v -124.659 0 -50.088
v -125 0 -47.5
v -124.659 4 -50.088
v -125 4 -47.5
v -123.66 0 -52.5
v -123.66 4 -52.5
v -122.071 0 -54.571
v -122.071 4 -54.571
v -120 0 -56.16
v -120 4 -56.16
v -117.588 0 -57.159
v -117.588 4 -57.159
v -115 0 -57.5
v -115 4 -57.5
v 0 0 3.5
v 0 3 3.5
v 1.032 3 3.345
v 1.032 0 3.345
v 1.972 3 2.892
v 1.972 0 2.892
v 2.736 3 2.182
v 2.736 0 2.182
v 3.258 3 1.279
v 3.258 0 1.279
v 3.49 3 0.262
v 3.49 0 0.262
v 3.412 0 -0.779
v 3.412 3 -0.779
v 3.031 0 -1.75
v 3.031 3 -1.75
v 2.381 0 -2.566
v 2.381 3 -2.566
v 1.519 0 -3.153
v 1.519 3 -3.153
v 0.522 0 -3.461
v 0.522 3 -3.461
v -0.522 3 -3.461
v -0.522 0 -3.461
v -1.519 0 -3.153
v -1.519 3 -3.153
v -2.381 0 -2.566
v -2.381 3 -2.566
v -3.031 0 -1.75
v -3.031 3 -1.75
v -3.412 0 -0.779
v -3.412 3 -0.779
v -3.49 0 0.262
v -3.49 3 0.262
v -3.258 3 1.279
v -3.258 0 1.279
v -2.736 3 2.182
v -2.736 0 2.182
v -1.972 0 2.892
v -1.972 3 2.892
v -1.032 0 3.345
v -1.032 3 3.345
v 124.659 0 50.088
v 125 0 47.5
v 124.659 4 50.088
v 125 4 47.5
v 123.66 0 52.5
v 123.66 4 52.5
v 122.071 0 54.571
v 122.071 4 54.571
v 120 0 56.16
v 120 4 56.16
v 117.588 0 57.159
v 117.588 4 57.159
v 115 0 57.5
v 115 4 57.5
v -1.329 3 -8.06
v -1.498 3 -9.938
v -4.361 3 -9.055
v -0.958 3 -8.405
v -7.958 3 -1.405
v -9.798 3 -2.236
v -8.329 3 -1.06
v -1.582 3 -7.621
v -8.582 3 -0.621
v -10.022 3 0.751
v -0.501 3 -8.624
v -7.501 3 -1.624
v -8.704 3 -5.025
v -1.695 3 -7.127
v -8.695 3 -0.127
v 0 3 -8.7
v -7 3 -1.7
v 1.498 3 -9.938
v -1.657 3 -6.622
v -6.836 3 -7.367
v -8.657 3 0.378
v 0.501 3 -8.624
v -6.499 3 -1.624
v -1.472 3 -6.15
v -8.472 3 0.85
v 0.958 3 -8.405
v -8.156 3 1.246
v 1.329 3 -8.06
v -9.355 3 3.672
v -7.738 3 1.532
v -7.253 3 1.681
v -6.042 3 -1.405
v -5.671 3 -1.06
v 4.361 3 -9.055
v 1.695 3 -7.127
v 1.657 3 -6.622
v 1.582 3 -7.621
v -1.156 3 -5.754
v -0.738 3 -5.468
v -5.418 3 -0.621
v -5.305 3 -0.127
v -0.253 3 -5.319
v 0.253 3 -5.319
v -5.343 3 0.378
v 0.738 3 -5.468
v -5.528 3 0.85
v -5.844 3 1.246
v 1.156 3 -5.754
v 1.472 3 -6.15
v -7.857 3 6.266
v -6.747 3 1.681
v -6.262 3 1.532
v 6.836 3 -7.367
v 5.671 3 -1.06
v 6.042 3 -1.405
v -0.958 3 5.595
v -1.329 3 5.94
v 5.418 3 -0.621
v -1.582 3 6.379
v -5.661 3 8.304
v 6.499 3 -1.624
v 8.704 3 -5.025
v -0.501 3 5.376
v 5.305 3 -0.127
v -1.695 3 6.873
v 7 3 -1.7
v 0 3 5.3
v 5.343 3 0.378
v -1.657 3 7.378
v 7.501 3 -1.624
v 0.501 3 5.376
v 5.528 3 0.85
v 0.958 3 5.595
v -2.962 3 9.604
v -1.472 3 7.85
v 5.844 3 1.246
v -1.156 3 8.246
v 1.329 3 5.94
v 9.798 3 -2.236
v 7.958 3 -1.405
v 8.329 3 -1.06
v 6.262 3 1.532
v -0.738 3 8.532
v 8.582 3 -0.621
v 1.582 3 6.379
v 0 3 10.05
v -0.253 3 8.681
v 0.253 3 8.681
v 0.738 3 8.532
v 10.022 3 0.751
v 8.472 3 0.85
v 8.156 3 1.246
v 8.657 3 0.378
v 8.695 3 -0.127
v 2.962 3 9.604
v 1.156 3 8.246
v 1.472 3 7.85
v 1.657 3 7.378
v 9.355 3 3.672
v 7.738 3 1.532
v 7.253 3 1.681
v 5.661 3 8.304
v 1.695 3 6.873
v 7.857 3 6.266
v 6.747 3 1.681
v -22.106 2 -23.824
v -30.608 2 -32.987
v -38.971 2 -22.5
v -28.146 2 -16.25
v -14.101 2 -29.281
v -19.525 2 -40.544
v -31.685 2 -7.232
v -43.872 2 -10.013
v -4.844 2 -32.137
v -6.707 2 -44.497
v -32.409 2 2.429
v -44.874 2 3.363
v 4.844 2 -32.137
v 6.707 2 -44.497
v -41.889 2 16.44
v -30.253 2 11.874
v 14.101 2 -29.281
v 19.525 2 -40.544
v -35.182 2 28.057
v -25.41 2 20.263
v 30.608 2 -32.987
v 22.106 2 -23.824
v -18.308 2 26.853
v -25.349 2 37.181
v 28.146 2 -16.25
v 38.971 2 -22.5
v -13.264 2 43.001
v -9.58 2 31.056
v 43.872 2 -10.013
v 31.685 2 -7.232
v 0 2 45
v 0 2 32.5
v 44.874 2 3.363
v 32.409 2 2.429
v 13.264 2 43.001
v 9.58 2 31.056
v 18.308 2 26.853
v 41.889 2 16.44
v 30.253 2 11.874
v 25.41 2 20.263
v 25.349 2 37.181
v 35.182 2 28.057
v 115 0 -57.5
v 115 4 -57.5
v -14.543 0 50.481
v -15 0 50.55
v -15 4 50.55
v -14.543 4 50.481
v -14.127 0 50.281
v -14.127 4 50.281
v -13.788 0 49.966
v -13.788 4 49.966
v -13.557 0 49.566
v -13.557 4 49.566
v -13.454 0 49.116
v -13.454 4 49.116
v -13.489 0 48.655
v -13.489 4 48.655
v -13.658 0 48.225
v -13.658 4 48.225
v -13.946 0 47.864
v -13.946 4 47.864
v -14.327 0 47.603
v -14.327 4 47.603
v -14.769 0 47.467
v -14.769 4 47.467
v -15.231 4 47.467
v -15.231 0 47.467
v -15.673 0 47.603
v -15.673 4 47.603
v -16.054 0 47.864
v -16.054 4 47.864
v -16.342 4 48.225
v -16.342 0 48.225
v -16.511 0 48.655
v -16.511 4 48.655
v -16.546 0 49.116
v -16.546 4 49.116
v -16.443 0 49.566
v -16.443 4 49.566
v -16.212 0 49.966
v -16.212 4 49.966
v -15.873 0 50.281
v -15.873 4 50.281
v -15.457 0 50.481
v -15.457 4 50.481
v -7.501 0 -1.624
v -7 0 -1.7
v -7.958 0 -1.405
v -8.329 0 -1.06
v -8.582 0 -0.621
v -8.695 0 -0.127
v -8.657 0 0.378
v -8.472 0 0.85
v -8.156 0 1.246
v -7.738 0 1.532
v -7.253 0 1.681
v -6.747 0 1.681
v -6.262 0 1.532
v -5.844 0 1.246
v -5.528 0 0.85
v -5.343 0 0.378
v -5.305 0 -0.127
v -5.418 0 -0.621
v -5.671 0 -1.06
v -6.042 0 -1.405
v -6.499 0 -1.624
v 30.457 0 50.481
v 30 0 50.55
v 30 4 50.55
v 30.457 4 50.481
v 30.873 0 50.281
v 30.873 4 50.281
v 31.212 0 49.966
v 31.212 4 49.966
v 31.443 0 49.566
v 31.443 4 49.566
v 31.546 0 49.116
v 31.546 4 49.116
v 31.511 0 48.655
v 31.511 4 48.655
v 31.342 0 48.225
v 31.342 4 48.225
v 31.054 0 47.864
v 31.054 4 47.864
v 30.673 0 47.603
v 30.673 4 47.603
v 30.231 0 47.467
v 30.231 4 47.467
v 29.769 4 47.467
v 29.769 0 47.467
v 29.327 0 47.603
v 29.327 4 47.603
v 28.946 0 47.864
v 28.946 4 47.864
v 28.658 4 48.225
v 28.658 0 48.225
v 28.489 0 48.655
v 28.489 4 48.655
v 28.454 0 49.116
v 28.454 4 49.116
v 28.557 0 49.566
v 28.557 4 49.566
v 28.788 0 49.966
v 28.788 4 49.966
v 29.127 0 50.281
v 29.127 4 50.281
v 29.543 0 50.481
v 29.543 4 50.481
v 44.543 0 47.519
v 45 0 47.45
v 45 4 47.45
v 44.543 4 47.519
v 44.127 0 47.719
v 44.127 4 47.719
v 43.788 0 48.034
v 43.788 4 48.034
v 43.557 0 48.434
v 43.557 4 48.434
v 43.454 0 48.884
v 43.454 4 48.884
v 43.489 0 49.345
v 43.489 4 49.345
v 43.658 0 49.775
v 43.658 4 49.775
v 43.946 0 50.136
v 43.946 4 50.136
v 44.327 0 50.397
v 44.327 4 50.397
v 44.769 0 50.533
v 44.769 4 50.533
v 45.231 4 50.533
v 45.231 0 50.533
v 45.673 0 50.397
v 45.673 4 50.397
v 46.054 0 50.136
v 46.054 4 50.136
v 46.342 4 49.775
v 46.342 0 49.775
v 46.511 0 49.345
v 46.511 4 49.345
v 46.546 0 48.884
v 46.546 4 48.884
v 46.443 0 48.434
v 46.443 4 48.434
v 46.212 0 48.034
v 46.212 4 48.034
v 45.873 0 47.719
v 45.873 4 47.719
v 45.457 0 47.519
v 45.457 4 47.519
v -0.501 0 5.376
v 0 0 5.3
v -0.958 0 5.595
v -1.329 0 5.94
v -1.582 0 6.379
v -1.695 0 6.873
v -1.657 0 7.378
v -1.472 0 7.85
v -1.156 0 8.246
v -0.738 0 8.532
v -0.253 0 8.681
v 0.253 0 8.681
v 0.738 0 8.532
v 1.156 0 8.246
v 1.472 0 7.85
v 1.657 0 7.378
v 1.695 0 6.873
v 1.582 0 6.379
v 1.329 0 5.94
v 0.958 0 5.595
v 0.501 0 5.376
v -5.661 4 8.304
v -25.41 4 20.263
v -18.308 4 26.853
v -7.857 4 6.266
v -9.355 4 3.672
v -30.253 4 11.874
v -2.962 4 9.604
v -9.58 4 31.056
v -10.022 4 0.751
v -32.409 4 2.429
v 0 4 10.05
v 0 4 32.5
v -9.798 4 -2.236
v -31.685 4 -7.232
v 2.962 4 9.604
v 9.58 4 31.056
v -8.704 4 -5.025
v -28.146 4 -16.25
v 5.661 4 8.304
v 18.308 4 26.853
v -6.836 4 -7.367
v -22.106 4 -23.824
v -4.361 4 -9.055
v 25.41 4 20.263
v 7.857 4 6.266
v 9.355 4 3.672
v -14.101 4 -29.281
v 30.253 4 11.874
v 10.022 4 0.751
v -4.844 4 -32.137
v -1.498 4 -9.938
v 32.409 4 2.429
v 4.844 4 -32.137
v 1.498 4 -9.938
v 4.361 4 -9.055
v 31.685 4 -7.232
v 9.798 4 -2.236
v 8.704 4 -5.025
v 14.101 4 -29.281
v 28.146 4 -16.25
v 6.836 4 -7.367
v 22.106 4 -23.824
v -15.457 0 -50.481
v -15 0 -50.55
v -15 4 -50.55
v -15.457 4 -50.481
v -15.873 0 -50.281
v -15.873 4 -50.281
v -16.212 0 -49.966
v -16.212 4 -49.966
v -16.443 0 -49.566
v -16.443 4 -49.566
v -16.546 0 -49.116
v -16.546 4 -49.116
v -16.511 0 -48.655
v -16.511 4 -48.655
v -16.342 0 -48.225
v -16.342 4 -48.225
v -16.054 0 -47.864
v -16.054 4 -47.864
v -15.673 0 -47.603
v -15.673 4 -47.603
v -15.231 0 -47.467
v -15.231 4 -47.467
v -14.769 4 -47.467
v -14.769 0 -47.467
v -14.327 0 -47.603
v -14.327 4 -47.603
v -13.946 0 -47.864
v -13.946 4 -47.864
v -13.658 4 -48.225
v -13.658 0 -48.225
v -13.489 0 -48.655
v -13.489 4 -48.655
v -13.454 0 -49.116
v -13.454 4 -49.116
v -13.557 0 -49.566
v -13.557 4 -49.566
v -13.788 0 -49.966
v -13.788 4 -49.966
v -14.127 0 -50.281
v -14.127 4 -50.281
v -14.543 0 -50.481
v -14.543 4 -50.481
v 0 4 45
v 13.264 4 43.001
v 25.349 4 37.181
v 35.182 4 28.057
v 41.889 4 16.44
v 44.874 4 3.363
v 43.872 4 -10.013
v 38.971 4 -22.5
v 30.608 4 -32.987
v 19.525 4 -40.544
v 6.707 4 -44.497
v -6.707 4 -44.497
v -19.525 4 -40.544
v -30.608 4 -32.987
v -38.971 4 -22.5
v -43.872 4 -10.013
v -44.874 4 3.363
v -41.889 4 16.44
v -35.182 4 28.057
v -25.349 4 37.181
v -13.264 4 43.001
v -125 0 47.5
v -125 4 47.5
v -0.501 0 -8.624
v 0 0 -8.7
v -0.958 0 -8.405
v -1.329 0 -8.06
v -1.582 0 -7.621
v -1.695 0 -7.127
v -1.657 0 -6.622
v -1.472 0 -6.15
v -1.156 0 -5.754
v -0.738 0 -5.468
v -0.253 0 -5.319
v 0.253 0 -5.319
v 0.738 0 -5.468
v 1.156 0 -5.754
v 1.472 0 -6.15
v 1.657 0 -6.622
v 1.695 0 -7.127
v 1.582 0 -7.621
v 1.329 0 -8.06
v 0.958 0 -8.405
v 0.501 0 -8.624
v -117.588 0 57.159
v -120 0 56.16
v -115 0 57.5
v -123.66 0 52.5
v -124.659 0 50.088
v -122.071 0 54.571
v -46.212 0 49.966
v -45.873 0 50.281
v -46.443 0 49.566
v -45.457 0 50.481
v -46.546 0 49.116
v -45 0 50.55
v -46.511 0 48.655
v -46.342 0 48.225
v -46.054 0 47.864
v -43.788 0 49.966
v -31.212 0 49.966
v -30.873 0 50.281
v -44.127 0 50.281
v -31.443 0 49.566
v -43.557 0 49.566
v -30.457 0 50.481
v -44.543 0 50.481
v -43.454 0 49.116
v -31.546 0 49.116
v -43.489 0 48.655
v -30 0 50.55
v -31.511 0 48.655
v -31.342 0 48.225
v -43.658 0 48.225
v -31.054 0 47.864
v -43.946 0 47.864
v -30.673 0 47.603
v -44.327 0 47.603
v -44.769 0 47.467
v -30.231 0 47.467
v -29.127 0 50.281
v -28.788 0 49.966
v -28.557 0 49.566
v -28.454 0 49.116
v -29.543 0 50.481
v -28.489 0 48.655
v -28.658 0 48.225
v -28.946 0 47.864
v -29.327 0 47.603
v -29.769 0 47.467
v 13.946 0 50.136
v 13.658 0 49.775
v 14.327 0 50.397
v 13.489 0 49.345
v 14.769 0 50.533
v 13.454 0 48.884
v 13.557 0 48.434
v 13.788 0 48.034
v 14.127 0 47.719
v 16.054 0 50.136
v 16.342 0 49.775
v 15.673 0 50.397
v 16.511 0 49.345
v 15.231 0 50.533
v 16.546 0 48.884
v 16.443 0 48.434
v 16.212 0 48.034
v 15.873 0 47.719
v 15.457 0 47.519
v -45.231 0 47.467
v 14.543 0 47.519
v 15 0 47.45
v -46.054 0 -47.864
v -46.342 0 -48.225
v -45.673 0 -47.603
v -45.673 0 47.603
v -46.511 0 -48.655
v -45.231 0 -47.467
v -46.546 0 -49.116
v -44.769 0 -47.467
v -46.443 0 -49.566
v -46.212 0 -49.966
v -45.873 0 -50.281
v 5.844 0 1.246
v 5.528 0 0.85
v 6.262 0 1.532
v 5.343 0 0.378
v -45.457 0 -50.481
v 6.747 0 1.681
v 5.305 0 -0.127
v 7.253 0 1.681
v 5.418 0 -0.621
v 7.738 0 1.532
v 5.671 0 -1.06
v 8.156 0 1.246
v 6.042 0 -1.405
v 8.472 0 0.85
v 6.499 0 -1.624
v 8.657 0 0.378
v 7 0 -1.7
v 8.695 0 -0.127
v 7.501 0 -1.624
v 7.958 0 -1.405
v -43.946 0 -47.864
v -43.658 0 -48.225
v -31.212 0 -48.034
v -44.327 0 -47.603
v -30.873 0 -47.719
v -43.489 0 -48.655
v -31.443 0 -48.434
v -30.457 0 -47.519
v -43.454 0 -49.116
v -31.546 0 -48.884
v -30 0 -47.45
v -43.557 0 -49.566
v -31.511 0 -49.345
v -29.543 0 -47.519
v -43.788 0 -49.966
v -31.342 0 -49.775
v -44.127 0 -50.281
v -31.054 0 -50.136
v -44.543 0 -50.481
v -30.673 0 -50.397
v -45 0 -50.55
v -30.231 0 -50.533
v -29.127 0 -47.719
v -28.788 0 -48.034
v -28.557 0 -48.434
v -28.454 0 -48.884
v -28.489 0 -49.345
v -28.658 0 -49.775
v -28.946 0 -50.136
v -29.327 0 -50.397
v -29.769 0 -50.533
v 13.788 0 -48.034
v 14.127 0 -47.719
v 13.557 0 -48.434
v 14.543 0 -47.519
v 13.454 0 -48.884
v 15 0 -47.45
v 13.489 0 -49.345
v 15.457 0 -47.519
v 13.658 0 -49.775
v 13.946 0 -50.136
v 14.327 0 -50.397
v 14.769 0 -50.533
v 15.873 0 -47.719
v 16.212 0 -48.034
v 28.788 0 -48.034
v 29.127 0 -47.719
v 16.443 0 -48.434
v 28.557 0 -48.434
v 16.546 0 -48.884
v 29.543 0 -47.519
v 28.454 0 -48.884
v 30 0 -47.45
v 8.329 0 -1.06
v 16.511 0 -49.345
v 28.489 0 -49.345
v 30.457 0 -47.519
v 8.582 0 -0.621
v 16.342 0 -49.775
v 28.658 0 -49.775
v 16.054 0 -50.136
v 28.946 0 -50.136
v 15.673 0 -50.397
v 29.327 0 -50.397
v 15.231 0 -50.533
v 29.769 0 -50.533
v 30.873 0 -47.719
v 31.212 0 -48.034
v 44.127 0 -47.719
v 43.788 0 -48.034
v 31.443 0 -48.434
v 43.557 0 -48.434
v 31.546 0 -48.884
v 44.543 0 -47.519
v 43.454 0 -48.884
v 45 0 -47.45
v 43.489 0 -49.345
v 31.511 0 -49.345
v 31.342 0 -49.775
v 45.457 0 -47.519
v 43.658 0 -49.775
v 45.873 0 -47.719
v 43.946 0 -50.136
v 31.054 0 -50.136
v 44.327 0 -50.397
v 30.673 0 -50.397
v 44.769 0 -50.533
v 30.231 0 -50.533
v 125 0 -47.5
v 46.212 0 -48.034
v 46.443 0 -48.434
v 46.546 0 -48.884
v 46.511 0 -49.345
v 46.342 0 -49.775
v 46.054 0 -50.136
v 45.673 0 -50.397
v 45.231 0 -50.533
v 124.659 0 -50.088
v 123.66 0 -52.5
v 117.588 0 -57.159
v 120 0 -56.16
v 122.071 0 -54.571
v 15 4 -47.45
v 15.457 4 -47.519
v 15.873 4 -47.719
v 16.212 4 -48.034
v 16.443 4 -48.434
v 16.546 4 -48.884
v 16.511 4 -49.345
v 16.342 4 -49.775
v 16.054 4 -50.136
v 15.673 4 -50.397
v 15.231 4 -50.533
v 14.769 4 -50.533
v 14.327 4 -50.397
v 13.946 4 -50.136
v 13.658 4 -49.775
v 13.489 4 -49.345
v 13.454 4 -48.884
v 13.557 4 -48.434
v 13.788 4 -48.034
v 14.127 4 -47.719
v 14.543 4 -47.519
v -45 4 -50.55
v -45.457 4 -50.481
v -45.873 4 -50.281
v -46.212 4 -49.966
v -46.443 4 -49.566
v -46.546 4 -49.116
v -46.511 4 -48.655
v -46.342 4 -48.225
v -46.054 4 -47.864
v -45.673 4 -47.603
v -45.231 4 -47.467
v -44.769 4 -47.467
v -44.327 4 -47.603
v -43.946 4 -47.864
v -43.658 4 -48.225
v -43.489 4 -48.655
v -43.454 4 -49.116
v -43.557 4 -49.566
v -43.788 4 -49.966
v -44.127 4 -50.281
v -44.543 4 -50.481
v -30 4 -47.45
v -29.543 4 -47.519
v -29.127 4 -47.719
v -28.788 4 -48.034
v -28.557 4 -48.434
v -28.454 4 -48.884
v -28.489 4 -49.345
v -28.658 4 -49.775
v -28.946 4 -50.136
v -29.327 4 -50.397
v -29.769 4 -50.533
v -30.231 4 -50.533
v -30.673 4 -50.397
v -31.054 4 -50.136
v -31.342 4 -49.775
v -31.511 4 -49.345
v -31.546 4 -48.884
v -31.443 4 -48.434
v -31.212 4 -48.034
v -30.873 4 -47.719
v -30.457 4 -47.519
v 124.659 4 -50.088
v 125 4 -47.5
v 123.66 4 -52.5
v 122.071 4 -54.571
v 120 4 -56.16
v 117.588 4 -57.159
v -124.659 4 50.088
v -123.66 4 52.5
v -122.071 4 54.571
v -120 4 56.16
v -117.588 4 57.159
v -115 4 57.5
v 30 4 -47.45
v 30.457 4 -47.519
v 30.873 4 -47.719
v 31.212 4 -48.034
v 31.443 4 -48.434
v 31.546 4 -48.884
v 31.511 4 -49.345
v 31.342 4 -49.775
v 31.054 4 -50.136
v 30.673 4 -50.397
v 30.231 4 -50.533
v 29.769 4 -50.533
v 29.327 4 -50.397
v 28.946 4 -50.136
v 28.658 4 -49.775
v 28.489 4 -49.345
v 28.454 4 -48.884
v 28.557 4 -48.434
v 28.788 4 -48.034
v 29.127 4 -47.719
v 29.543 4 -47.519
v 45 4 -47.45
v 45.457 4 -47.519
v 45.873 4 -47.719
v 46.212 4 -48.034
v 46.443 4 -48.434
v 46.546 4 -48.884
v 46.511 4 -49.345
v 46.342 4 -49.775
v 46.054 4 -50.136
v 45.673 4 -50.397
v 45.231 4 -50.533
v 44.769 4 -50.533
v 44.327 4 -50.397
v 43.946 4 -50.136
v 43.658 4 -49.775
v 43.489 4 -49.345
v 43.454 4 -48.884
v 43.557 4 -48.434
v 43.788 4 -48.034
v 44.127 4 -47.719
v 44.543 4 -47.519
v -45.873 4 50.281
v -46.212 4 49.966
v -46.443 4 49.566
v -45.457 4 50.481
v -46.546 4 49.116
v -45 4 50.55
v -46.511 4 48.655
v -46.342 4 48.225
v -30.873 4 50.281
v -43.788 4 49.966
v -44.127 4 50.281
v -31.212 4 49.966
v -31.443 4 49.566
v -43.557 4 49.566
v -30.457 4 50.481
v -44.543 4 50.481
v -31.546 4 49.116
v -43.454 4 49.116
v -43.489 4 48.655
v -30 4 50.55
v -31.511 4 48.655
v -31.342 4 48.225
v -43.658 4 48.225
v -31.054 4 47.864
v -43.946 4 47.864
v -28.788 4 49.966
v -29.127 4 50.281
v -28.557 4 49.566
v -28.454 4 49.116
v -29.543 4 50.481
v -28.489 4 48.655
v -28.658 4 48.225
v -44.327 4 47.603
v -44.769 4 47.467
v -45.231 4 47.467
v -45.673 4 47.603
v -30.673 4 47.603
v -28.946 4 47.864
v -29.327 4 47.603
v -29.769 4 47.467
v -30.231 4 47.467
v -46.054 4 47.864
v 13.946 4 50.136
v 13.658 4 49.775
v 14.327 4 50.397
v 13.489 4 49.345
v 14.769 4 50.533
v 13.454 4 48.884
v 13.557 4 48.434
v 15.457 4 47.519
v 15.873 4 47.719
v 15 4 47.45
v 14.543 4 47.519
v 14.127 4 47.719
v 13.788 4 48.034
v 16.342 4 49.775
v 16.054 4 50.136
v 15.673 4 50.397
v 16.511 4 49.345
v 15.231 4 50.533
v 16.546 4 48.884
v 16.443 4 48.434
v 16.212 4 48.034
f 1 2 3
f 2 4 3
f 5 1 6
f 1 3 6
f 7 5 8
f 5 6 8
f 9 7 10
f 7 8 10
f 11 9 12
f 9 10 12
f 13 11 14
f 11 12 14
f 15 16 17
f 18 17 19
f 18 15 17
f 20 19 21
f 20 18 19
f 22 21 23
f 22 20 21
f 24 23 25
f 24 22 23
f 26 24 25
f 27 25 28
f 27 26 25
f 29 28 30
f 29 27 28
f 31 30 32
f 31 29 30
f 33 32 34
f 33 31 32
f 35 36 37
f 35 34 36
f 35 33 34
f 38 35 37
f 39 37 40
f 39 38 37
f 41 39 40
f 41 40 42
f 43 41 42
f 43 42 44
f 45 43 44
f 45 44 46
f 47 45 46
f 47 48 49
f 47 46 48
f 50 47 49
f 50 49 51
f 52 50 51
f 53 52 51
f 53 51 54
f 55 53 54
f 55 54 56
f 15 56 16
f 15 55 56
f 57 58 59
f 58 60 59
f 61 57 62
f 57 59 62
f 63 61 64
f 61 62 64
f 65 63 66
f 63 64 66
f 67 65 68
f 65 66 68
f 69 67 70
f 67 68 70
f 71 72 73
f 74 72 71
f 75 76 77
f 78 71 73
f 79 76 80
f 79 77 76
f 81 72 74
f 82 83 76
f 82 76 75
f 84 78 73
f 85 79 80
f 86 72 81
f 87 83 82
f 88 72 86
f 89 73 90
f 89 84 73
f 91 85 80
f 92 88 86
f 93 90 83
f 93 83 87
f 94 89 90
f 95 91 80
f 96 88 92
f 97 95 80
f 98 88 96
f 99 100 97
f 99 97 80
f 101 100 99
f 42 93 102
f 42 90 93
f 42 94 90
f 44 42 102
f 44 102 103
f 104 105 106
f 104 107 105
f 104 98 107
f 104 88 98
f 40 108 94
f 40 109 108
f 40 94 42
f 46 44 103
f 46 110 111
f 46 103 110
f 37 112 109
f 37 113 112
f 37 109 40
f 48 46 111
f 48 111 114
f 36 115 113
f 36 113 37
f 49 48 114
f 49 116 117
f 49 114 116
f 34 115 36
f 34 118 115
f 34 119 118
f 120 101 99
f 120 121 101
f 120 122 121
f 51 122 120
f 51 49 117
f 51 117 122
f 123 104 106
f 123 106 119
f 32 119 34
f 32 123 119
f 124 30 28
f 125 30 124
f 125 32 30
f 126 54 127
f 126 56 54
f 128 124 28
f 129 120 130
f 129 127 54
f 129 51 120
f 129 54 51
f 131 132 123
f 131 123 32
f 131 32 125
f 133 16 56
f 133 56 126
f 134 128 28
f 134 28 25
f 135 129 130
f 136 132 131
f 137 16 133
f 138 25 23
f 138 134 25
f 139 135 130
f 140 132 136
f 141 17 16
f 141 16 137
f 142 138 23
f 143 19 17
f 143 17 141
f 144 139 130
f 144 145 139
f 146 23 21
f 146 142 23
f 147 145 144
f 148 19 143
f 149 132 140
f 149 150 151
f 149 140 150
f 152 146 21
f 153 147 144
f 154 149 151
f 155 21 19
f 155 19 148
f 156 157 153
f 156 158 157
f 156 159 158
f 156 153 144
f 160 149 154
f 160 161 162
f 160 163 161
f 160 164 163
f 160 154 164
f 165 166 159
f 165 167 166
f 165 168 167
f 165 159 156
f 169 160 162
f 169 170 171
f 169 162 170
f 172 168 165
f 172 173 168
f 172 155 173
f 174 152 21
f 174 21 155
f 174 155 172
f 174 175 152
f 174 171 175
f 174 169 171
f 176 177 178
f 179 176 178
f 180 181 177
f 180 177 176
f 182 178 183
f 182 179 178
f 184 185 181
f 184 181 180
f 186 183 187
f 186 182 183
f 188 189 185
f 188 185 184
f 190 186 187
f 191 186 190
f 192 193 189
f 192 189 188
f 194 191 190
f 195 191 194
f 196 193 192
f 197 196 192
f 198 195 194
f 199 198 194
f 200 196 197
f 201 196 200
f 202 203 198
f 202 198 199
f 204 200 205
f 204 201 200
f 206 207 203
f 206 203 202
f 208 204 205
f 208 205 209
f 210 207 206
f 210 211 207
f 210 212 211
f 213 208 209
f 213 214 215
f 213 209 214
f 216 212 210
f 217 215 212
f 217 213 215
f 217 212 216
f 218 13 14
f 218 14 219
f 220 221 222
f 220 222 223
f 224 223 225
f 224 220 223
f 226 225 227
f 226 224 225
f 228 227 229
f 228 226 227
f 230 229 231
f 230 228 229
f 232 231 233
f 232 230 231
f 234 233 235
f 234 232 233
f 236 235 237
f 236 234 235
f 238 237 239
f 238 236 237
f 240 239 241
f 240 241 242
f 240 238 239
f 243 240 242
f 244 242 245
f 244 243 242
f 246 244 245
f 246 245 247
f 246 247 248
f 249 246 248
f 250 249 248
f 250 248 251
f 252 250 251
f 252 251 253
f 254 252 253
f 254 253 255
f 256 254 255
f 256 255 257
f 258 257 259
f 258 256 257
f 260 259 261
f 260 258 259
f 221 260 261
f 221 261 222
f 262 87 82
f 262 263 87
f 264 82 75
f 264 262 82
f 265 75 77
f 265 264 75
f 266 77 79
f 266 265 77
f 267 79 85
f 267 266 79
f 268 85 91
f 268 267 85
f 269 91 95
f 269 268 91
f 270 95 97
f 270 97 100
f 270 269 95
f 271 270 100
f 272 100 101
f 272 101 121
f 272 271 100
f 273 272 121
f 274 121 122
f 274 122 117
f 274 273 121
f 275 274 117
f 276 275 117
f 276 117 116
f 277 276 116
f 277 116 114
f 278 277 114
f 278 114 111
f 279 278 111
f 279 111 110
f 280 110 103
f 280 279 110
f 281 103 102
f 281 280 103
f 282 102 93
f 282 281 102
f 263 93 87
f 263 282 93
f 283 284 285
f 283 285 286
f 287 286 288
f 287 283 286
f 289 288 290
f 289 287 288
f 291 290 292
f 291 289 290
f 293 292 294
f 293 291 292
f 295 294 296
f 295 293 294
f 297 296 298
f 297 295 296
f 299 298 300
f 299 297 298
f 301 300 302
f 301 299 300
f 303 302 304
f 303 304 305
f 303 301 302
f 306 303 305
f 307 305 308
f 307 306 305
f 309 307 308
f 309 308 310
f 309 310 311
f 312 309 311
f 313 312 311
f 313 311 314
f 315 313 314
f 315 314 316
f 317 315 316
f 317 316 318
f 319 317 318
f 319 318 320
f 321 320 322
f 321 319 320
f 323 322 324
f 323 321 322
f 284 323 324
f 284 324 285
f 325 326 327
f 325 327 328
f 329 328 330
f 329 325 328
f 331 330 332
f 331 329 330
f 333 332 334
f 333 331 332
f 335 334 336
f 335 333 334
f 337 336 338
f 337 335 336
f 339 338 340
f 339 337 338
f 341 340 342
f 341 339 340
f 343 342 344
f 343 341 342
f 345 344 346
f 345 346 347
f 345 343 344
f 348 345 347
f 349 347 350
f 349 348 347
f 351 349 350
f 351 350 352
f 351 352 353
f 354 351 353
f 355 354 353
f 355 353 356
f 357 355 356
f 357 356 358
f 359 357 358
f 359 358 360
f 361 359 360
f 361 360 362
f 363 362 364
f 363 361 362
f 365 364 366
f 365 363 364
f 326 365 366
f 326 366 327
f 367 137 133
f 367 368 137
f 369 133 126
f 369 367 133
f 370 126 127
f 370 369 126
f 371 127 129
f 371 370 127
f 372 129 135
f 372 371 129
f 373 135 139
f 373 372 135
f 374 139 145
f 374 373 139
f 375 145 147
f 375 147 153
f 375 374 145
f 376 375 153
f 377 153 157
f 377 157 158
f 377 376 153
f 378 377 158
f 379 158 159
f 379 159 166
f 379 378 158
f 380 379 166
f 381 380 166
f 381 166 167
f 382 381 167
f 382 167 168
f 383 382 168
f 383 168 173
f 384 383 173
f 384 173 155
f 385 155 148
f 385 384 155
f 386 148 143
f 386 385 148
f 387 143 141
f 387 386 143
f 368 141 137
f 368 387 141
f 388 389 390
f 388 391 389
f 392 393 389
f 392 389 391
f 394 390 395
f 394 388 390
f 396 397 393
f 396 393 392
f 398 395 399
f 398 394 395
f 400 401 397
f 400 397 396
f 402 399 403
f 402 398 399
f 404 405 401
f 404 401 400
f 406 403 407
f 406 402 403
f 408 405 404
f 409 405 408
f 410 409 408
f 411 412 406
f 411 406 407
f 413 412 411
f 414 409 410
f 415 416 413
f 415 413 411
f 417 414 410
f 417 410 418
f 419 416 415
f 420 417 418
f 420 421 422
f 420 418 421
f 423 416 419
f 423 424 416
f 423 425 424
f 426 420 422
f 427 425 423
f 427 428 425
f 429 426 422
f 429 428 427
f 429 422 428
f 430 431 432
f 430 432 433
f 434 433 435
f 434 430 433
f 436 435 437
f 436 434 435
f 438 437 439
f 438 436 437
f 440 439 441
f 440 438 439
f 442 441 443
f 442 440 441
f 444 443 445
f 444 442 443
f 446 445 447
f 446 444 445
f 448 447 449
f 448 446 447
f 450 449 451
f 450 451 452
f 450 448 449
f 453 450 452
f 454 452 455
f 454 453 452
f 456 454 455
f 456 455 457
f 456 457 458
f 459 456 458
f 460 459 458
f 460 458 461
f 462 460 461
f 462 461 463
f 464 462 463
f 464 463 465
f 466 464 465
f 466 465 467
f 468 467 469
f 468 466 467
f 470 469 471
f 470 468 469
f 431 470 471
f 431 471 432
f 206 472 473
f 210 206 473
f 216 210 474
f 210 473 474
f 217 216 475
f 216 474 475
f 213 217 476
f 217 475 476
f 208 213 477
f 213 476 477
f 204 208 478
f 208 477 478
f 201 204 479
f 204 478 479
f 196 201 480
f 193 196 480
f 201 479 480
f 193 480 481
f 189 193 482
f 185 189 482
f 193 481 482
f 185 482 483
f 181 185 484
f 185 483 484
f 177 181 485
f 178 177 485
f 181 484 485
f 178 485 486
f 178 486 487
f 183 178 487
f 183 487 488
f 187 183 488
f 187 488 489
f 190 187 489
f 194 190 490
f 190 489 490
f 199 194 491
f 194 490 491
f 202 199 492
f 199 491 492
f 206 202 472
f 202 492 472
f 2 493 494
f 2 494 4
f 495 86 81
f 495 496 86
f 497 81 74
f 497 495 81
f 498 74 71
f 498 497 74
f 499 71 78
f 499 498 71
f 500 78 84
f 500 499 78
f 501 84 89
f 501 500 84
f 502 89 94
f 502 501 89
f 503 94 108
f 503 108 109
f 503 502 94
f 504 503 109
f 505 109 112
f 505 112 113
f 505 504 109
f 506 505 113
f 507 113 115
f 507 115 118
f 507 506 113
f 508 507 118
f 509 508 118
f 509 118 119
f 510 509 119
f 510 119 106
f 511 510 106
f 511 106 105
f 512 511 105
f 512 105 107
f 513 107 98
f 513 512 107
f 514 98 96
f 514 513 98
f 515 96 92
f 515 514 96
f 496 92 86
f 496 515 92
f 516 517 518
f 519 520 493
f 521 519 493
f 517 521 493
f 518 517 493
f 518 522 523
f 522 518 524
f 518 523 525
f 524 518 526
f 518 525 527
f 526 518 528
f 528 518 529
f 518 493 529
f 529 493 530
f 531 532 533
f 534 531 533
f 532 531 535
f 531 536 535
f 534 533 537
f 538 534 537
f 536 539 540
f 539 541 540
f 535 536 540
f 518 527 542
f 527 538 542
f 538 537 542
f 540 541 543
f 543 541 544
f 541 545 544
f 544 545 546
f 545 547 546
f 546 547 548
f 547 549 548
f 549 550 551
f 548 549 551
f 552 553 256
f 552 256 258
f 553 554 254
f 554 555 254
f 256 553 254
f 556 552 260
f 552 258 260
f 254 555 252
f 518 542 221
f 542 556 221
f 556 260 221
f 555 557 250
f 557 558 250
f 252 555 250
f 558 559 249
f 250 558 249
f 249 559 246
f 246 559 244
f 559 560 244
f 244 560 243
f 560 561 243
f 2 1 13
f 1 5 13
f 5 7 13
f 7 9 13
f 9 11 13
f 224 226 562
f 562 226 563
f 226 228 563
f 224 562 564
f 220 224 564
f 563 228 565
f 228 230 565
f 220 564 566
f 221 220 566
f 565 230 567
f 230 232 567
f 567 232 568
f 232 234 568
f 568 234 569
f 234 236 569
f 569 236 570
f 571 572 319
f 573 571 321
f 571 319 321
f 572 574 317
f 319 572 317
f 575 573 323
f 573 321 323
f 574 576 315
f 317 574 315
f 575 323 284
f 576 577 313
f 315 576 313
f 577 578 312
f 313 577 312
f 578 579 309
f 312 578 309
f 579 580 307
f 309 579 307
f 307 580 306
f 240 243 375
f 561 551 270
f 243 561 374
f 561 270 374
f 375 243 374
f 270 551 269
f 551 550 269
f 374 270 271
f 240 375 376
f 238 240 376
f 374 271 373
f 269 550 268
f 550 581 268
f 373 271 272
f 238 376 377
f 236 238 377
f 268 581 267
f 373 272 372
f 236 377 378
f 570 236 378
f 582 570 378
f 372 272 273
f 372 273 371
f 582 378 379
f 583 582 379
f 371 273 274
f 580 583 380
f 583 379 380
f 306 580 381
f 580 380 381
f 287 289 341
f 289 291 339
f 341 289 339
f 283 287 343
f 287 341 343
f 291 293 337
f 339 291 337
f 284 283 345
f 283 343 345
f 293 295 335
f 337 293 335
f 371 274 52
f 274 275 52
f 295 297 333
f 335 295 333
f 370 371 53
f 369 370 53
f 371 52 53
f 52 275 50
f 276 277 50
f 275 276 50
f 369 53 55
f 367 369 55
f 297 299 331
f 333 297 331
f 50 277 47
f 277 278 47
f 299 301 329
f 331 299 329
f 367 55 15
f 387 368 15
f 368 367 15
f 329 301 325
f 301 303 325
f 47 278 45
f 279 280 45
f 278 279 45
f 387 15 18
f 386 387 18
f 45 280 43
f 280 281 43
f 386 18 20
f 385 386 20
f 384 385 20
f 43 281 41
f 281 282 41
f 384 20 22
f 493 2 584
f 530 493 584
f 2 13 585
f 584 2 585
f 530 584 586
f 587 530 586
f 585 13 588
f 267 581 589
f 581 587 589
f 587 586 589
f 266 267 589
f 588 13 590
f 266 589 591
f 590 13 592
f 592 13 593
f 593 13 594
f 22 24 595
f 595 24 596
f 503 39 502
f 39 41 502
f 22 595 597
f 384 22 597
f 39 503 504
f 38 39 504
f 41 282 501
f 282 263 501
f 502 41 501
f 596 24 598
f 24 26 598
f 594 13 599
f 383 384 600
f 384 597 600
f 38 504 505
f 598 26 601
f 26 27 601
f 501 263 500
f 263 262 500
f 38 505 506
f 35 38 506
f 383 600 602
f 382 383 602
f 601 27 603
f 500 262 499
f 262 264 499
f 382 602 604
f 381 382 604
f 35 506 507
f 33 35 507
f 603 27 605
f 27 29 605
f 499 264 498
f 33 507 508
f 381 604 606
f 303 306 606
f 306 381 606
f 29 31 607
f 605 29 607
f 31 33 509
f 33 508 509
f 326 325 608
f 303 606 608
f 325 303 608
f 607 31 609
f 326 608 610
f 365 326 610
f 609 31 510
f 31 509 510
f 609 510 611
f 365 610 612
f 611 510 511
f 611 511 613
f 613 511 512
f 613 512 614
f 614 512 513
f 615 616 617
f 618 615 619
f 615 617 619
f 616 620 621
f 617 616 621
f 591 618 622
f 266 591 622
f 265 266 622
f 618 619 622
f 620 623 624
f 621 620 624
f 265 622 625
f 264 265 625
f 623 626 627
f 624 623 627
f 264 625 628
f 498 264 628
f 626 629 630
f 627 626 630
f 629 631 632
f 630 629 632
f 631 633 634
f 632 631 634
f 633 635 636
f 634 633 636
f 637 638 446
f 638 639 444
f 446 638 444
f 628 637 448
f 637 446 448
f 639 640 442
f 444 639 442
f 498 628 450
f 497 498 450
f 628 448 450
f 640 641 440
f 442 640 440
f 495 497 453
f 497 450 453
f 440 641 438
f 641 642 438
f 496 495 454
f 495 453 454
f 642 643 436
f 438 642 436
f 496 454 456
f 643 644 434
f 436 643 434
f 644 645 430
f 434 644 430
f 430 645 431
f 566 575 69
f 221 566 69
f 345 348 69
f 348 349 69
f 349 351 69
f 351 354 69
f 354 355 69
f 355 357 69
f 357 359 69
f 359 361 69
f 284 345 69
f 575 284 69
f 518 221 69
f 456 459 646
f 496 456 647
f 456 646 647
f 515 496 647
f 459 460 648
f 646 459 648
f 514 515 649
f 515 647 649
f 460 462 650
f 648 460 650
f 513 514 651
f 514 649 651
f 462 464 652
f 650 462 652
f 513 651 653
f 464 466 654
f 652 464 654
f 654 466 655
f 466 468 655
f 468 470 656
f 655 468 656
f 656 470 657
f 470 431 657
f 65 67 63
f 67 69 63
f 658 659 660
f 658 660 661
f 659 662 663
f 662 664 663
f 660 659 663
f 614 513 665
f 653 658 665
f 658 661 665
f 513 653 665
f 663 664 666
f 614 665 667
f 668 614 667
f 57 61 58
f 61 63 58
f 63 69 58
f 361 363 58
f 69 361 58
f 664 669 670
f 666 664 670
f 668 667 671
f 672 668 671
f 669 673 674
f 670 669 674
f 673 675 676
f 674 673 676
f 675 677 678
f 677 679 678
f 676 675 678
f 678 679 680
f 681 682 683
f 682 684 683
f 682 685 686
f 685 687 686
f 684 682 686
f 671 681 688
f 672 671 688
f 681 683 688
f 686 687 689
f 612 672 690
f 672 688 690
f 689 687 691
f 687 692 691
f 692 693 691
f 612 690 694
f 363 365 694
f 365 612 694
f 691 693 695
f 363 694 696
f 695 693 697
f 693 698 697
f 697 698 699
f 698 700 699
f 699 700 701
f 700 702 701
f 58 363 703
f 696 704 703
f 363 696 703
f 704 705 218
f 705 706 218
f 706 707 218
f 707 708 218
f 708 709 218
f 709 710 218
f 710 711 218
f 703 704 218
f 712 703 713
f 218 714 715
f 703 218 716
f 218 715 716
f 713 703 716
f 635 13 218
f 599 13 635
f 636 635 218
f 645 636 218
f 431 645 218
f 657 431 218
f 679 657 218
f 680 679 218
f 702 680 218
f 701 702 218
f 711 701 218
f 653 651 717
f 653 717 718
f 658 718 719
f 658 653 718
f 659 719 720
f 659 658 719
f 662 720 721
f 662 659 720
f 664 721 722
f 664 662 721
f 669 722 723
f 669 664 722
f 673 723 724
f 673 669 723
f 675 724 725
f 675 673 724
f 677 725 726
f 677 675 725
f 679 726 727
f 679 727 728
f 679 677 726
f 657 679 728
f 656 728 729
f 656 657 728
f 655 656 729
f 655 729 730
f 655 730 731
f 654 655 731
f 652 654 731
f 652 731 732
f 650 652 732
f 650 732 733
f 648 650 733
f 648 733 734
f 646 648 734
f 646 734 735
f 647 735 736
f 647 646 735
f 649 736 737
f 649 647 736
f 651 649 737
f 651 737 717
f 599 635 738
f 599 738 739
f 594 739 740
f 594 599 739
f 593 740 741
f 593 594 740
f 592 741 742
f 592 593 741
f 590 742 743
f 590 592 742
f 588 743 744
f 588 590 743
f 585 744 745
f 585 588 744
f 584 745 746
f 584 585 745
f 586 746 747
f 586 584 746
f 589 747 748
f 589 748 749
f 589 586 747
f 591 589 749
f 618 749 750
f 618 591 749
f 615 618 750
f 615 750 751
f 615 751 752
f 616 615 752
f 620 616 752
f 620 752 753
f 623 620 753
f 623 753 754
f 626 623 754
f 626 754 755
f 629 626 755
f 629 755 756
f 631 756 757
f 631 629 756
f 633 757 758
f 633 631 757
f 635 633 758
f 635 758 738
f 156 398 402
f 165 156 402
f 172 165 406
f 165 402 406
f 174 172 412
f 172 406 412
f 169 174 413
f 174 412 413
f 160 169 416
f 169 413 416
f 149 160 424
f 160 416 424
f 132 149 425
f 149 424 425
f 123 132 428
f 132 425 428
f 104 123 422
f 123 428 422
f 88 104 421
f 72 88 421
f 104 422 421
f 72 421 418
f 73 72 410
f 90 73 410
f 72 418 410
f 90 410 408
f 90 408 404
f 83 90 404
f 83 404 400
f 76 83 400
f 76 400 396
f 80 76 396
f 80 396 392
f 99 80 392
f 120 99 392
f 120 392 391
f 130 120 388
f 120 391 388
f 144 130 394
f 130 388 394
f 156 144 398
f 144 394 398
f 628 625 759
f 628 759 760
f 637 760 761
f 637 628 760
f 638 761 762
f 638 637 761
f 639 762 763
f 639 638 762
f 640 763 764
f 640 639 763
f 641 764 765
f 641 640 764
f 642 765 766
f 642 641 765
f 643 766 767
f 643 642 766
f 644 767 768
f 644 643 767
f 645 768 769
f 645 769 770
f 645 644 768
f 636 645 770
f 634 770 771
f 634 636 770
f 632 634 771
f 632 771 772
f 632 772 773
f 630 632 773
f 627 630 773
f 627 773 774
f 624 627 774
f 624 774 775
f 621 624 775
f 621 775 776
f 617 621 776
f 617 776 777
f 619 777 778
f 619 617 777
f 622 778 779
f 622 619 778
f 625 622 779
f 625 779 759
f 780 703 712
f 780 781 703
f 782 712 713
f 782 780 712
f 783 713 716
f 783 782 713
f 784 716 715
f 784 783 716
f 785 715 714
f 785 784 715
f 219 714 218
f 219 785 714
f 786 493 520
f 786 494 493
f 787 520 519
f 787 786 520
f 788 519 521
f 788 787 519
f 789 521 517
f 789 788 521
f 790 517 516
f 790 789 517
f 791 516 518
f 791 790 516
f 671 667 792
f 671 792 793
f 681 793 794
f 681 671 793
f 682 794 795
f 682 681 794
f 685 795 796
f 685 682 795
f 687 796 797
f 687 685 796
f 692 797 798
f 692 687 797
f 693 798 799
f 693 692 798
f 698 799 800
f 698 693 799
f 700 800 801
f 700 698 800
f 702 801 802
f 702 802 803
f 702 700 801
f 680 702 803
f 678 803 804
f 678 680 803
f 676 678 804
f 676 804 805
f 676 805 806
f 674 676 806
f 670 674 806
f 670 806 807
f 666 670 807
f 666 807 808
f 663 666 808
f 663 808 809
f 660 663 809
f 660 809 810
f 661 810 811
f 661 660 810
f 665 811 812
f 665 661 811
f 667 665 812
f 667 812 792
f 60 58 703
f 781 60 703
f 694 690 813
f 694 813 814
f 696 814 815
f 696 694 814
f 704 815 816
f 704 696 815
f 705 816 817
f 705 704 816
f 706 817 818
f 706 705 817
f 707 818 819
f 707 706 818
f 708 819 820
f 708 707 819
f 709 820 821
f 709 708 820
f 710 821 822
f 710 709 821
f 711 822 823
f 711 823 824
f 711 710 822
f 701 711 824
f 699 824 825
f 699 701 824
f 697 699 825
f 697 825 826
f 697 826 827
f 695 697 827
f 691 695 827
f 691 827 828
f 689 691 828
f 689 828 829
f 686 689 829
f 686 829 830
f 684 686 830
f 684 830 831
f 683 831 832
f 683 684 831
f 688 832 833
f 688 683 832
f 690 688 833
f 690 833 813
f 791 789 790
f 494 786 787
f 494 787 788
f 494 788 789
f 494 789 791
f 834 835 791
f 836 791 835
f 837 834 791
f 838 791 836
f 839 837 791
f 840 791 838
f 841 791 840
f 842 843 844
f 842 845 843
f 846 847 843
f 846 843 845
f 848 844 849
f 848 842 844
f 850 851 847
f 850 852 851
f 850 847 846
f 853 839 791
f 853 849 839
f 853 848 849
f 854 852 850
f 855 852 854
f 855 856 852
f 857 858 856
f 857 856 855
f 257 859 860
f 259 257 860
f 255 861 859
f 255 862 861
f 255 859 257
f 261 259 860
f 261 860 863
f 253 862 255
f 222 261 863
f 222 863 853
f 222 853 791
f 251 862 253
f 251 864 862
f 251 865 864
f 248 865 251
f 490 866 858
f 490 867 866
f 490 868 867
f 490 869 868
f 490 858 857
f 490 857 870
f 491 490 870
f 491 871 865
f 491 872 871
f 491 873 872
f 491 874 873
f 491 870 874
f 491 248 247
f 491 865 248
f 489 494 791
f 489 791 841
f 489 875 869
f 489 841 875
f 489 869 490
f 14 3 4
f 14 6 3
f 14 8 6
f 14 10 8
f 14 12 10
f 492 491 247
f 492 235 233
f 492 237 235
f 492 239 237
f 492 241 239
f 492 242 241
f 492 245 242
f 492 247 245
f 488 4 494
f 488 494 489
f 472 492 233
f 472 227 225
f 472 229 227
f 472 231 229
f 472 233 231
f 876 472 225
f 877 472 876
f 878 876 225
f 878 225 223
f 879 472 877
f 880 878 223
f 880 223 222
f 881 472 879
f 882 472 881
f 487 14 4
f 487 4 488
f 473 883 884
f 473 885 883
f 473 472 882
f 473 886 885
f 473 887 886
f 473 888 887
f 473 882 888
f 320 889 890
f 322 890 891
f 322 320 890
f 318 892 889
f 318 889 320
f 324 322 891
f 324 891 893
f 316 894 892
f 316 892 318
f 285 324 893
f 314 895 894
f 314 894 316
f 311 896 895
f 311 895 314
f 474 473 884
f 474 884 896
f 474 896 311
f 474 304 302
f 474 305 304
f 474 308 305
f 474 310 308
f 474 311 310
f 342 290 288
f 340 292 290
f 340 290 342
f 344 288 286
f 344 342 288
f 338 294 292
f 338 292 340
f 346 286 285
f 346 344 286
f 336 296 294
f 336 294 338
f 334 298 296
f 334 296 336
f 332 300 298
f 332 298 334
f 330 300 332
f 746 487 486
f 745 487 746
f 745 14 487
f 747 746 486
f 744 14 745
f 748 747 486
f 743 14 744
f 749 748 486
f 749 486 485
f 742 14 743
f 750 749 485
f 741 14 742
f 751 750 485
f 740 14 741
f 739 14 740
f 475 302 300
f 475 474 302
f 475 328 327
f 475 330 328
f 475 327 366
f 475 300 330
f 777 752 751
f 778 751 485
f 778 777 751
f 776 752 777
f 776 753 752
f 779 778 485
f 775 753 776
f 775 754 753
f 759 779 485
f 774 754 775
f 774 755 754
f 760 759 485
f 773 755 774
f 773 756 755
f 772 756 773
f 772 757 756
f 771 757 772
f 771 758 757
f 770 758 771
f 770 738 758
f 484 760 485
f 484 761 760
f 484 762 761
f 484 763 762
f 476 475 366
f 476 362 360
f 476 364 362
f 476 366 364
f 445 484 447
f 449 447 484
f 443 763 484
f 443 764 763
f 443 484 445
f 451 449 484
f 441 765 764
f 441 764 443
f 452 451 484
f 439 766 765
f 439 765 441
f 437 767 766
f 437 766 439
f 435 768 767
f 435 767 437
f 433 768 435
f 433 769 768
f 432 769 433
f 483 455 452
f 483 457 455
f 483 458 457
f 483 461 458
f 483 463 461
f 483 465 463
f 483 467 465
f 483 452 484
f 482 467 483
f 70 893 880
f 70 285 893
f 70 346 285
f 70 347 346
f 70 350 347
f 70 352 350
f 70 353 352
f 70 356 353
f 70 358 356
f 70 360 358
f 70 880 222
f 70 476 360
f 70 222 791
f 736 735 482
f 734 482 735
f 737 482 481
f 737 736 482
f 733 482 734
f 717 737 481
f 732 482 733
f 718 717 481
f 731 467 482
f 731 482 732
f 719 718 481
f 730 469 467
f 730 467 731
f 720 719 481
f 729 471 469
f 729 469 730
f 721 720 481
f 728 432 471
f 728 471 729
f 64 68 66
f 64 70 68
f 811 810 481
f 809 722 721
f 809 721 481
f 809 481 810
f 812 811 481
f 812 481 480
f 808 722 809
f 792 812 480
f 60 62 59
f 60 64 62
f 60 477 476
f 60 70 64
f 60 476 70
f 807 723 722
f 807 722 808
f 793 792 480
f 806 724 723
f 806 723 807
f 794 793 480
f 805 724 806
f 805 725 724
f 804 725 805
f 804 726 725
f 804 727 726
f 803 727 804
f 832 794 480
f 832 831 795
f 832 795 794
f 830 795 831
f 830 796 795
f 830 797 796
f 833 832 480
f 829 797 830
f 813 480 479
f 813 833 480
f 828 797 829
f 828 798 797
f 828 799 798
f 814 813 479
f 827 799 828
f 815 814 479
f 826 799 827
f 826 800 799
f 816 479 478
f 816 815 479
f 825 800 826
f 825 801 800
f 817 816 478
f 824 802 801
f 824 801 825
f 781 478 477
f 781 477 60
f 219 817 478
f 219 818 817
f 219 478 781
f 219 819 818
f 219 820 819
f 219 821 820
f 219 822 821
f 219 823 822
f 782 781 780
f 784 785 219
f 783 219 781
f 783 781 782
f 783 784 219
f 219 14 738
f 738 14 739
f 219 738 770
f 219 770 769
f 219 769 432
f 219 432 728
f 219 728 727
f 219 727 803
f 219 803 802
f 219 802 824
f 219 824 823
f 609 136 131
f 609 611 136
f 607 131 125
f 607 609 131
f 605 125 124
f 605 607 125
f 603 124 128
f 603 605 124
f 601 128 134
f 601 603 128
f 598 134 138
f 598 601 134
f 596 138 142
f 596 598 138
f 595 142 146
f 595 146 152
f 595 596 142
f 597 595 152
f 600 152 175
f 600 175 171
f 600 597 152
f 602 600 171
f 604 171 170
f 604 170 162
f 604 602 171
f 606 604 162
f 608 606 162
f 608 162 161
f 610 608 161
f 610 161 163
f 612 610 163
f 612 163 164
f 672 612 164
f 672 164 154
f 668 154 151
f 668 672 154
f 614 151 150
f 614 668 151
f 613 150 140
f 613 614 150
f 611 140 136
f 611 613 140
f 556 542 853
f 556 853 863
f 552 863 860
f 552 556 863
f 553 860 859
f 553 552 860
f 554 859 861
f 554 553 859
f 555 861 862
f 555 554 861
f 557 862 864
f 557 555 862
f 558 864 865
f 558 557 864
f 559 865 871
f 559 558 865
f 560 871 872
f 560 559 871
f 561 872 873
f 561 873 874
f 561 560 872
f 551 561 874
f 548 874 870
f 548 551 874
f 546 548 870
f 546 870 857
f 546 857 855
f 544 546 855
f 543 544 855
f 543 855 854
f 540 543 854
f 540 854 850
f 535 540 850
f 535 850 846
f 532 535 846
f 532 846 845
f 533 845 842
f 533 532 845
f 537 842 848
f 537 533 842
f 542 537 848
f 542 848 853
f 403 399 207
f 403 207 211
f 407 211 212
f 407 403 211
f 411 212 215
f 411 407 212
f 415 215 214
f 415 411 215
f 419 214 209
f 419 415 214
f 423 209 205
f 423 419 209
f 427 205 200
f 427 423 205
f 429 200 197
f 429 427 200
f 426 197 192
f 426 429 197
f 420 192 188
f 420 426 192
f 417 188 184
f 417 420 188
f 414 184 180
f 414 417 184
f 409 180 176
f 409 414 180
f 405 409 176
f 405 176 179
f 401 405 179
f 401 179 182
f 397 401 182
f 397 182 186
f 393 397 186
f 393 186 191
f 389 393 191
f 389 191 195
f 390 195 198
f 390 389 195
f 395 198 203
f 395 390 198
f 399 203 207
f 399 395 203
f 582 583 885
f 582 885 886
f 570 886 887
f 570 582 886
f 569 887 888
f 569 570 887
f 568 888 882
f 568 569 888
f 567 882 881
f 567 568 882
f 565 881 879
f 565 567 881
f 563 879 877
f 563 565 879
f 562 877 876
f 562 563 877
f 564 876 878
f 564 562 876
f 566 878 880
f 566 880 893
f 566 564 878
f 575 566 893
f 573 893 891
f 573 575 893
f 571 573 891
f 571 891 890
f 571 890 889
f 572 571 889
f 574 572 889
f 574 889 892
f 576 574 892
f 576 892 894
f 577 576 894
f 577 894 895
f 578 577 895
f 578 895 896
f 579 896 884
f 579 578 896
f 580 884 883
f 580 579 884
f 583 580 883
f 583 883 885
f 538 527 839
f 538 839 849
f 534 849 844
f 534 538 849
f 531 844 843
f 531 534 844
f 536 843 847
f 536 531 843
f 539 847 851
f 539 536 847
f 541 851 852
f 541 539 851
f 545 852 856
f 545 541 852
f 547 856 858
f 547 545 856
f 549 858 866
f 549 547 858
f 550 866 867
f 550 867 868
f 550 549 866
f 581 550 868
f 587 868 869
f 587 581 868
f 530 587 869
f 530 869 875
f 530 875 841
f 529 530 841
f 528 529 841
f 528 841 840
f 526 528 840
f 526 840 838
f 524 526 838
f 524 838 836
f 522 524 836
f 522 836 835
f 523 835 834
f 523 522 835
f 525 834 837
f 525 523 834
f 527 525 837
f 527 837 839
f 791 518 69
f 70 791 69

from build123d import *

# Parameters (mm, degrees)
SKETCH_1_W               = 250
SKETCH_1_H               = 115
SKETCH_1_R               = 3.5
SKETCH_1_R_2             = 1.55
EXTRUDE_1_DEPTH          = 4
SKETCH_2_R               = 45
SKETCH_2_R_2             = 32.5
CUT_EXTRUDE_1_DEPTH      = 2
SKETCH_3_R               = 10.05
SKETCH_3_R_2             = 1.7
CUT_EXTRUDE_2_DEPTH      = 1
CUT_EXTRUDE_5_DEPTH      = 20
CUT_EXTRUDE_5_DEPTH_BACK = 20
SKETCH_4_R               = 1.7
FILLET_1_R               = 10


with BuildPart() as part:
    # 草图1 → 凸台-拉伸1 (new body)
    with BuildSketch(Plane(origin=(0, 0, 0), x_dir=(1, 0, 0), z_dir=(0, 1, 0))):
        Rectangle(SKETCH_1_W, SKETCH_1_H)
        with Locations(Location((0, 0, 0), (0, 0, 270))):
            Circle(SKETCH_1_R, mode=Mode.SUBTRACT)
        with Locations(Location((45, 49, 0), (0, 0, 270))):
            Circle(SKETCH_1_R_2, mode=Mode.SUBTRACT)
        with Locations(Location((45, -49, 0), (0, 0, 90))):
            Circle(SKETCH_1_R_2, mode=Mode.SUBTRACT)
        with Locations(Location((-45, -49, 0), (0, 0, 270))):
            Circle(SKETCH_1_R_2, mode=Mode.SUBTRACT)
        with Locations(Location((-45, 49, 0), (0, 0, 90))):
            Circle(SKETCH_1_R_2, mode=Mode.SUBTRACT)
        with Locations(Location((-15, -49, 0), (0, 0, 270))):
            Circle(SKETCH_1_R_2, mode=Mode.SUBTRACT)
        with Locations(Location((15, -49, 0), (0, 0, 90))):
            Circle(SKETCH_1_R_2, mode=Mode.SUBTRACT)
        with Locations(Location((15, 49, 0), (0, 0, 270))):
            Circle(SKETCH_1_R_2, mode=Mode.SUBTRACT)
        with Locations(Location((-15, 49, 0), (0, 0, 90))):
            Circle(SKETCH_1_R_2, mode=Mode.SUBTRACT)
        with Locations(Location((30, 49, 0), (0, 0, 270))):
            Circle(SKETCH_1_R_2, mode=Mode.SUBTRACT)
        with Locations(Location((-30, 49, 0), (0, 0, 270))):
            Circle(SKETCH_1_R_2, mode=Mode.SUBTRACT)
        with Locations(Location((-30, -49, 0), (0, 0, 270))):
            Circle(SKETCH_1_R_2, mode=Mode.SUBTRACT)
        with Locations(Location((30, -49, 0), (0, 0, 270))):
            Circle(SKETCH_1_R_2, mode=Mode.SUBTRACT)
    extrude(amount=EXTRUDE_1_DEPTH)

    # 草图2 → 切除-拉伸1 (cut)
    with BuildSketch(Plane(origin=(0, 4, 0), x_dir=(1, 0, 0), z_dir=(0, 1, 0))):
        with Locations(Location((0, 0, 0), (0, 0, 270))):
            Circle(SKETCH_2_R)
        with Locations(Location((0, 0, 0), (0, 0, 270))):
            Circle(SKETCH_2_R_2, mode=Mode.SUBTRACT)
    extrude(amount=-CUT_EXTRUDE_1_DEPTH, mode=Mode.SUBTRACT)

    # 草图3 → 切除-拉伸2 (cut)
    with BuildSketch(Plane(origin=(0, 4, 0), x_dir=(1, 0, 0), z_dir=(0, 1, 0))):
        with Locations(Location((0, 0, 0), (0, 0, 270))):
            Circle(SKETCH_3_R)
        with Locations(Location((0, 7, 0), (0, 0, 270))):
            Circle(SKETCH_3_R_2, mode=Mode.SUBTRACT)
        with Locations(Location((7, 0, 0), (0, 0, 270))):
            Circle(SKETCH_3_R_2, mode=Mode.SUBTRACT)
        with Locations(Location((0, -7, 0), (0, 0, 270))):
            Circle(SKETCH_3_R_2, mode=Mode.SUBTRACT)
        with Locations(Location((-7, 0, 0), (0, 0, 270))):
            Circle(SKETCH_3_R_2, mode=Mode.SUBTRACT)
    extrude(amount=-CUT_EXTRUDE_2_DEPTH, mode=Mode.SUBTRACT)

    # 草图4 → 切除-拉伸5 (cut, two sides: drawn at the far end of the back side and taken through both)
    with BuildSketch(Plane(origin=(0, 3, 0), x_dir=(1, 0, 0), z_dir=(0, 1, 0)).offset(-CUT_EXTRUDE_5_DEPTH_BACK)):
        with Locations(Location((7, 0, 0), (0, 0, 90))):
            Circle(SKETCH_4_R)
        with Locations(Location((0, 7, 0), (0, 0, 90))):
            Circle(SKETCH_4_R)
        with Locations(Location((0, -7, 0), (0, 0, 90))):
            Circle(SKETCH_4_R)
        with Locations(Location((-7, 0, 0), (0, 0, 90))):
            Circle(SKETCH_4_R)
    extrude(amount=CUT_EXTRUDE_5_DEPTH + CUT_EXTRUDE_5_DEPTH_BACK, mode=Mode.SUBTRACT)

    # 圆角1
    fillet_1_edges = [part.edges().sort_by_distance(p)[0] for p in [
        (125, 2, 57.5),
        (-125, 2, 57.5),
        (-125, 2, -57.5),
        (125, 2, -57.5),
    ]]
    fillet(fillet_1_edges, radius=FILLET_1_R)


solid = part.part
